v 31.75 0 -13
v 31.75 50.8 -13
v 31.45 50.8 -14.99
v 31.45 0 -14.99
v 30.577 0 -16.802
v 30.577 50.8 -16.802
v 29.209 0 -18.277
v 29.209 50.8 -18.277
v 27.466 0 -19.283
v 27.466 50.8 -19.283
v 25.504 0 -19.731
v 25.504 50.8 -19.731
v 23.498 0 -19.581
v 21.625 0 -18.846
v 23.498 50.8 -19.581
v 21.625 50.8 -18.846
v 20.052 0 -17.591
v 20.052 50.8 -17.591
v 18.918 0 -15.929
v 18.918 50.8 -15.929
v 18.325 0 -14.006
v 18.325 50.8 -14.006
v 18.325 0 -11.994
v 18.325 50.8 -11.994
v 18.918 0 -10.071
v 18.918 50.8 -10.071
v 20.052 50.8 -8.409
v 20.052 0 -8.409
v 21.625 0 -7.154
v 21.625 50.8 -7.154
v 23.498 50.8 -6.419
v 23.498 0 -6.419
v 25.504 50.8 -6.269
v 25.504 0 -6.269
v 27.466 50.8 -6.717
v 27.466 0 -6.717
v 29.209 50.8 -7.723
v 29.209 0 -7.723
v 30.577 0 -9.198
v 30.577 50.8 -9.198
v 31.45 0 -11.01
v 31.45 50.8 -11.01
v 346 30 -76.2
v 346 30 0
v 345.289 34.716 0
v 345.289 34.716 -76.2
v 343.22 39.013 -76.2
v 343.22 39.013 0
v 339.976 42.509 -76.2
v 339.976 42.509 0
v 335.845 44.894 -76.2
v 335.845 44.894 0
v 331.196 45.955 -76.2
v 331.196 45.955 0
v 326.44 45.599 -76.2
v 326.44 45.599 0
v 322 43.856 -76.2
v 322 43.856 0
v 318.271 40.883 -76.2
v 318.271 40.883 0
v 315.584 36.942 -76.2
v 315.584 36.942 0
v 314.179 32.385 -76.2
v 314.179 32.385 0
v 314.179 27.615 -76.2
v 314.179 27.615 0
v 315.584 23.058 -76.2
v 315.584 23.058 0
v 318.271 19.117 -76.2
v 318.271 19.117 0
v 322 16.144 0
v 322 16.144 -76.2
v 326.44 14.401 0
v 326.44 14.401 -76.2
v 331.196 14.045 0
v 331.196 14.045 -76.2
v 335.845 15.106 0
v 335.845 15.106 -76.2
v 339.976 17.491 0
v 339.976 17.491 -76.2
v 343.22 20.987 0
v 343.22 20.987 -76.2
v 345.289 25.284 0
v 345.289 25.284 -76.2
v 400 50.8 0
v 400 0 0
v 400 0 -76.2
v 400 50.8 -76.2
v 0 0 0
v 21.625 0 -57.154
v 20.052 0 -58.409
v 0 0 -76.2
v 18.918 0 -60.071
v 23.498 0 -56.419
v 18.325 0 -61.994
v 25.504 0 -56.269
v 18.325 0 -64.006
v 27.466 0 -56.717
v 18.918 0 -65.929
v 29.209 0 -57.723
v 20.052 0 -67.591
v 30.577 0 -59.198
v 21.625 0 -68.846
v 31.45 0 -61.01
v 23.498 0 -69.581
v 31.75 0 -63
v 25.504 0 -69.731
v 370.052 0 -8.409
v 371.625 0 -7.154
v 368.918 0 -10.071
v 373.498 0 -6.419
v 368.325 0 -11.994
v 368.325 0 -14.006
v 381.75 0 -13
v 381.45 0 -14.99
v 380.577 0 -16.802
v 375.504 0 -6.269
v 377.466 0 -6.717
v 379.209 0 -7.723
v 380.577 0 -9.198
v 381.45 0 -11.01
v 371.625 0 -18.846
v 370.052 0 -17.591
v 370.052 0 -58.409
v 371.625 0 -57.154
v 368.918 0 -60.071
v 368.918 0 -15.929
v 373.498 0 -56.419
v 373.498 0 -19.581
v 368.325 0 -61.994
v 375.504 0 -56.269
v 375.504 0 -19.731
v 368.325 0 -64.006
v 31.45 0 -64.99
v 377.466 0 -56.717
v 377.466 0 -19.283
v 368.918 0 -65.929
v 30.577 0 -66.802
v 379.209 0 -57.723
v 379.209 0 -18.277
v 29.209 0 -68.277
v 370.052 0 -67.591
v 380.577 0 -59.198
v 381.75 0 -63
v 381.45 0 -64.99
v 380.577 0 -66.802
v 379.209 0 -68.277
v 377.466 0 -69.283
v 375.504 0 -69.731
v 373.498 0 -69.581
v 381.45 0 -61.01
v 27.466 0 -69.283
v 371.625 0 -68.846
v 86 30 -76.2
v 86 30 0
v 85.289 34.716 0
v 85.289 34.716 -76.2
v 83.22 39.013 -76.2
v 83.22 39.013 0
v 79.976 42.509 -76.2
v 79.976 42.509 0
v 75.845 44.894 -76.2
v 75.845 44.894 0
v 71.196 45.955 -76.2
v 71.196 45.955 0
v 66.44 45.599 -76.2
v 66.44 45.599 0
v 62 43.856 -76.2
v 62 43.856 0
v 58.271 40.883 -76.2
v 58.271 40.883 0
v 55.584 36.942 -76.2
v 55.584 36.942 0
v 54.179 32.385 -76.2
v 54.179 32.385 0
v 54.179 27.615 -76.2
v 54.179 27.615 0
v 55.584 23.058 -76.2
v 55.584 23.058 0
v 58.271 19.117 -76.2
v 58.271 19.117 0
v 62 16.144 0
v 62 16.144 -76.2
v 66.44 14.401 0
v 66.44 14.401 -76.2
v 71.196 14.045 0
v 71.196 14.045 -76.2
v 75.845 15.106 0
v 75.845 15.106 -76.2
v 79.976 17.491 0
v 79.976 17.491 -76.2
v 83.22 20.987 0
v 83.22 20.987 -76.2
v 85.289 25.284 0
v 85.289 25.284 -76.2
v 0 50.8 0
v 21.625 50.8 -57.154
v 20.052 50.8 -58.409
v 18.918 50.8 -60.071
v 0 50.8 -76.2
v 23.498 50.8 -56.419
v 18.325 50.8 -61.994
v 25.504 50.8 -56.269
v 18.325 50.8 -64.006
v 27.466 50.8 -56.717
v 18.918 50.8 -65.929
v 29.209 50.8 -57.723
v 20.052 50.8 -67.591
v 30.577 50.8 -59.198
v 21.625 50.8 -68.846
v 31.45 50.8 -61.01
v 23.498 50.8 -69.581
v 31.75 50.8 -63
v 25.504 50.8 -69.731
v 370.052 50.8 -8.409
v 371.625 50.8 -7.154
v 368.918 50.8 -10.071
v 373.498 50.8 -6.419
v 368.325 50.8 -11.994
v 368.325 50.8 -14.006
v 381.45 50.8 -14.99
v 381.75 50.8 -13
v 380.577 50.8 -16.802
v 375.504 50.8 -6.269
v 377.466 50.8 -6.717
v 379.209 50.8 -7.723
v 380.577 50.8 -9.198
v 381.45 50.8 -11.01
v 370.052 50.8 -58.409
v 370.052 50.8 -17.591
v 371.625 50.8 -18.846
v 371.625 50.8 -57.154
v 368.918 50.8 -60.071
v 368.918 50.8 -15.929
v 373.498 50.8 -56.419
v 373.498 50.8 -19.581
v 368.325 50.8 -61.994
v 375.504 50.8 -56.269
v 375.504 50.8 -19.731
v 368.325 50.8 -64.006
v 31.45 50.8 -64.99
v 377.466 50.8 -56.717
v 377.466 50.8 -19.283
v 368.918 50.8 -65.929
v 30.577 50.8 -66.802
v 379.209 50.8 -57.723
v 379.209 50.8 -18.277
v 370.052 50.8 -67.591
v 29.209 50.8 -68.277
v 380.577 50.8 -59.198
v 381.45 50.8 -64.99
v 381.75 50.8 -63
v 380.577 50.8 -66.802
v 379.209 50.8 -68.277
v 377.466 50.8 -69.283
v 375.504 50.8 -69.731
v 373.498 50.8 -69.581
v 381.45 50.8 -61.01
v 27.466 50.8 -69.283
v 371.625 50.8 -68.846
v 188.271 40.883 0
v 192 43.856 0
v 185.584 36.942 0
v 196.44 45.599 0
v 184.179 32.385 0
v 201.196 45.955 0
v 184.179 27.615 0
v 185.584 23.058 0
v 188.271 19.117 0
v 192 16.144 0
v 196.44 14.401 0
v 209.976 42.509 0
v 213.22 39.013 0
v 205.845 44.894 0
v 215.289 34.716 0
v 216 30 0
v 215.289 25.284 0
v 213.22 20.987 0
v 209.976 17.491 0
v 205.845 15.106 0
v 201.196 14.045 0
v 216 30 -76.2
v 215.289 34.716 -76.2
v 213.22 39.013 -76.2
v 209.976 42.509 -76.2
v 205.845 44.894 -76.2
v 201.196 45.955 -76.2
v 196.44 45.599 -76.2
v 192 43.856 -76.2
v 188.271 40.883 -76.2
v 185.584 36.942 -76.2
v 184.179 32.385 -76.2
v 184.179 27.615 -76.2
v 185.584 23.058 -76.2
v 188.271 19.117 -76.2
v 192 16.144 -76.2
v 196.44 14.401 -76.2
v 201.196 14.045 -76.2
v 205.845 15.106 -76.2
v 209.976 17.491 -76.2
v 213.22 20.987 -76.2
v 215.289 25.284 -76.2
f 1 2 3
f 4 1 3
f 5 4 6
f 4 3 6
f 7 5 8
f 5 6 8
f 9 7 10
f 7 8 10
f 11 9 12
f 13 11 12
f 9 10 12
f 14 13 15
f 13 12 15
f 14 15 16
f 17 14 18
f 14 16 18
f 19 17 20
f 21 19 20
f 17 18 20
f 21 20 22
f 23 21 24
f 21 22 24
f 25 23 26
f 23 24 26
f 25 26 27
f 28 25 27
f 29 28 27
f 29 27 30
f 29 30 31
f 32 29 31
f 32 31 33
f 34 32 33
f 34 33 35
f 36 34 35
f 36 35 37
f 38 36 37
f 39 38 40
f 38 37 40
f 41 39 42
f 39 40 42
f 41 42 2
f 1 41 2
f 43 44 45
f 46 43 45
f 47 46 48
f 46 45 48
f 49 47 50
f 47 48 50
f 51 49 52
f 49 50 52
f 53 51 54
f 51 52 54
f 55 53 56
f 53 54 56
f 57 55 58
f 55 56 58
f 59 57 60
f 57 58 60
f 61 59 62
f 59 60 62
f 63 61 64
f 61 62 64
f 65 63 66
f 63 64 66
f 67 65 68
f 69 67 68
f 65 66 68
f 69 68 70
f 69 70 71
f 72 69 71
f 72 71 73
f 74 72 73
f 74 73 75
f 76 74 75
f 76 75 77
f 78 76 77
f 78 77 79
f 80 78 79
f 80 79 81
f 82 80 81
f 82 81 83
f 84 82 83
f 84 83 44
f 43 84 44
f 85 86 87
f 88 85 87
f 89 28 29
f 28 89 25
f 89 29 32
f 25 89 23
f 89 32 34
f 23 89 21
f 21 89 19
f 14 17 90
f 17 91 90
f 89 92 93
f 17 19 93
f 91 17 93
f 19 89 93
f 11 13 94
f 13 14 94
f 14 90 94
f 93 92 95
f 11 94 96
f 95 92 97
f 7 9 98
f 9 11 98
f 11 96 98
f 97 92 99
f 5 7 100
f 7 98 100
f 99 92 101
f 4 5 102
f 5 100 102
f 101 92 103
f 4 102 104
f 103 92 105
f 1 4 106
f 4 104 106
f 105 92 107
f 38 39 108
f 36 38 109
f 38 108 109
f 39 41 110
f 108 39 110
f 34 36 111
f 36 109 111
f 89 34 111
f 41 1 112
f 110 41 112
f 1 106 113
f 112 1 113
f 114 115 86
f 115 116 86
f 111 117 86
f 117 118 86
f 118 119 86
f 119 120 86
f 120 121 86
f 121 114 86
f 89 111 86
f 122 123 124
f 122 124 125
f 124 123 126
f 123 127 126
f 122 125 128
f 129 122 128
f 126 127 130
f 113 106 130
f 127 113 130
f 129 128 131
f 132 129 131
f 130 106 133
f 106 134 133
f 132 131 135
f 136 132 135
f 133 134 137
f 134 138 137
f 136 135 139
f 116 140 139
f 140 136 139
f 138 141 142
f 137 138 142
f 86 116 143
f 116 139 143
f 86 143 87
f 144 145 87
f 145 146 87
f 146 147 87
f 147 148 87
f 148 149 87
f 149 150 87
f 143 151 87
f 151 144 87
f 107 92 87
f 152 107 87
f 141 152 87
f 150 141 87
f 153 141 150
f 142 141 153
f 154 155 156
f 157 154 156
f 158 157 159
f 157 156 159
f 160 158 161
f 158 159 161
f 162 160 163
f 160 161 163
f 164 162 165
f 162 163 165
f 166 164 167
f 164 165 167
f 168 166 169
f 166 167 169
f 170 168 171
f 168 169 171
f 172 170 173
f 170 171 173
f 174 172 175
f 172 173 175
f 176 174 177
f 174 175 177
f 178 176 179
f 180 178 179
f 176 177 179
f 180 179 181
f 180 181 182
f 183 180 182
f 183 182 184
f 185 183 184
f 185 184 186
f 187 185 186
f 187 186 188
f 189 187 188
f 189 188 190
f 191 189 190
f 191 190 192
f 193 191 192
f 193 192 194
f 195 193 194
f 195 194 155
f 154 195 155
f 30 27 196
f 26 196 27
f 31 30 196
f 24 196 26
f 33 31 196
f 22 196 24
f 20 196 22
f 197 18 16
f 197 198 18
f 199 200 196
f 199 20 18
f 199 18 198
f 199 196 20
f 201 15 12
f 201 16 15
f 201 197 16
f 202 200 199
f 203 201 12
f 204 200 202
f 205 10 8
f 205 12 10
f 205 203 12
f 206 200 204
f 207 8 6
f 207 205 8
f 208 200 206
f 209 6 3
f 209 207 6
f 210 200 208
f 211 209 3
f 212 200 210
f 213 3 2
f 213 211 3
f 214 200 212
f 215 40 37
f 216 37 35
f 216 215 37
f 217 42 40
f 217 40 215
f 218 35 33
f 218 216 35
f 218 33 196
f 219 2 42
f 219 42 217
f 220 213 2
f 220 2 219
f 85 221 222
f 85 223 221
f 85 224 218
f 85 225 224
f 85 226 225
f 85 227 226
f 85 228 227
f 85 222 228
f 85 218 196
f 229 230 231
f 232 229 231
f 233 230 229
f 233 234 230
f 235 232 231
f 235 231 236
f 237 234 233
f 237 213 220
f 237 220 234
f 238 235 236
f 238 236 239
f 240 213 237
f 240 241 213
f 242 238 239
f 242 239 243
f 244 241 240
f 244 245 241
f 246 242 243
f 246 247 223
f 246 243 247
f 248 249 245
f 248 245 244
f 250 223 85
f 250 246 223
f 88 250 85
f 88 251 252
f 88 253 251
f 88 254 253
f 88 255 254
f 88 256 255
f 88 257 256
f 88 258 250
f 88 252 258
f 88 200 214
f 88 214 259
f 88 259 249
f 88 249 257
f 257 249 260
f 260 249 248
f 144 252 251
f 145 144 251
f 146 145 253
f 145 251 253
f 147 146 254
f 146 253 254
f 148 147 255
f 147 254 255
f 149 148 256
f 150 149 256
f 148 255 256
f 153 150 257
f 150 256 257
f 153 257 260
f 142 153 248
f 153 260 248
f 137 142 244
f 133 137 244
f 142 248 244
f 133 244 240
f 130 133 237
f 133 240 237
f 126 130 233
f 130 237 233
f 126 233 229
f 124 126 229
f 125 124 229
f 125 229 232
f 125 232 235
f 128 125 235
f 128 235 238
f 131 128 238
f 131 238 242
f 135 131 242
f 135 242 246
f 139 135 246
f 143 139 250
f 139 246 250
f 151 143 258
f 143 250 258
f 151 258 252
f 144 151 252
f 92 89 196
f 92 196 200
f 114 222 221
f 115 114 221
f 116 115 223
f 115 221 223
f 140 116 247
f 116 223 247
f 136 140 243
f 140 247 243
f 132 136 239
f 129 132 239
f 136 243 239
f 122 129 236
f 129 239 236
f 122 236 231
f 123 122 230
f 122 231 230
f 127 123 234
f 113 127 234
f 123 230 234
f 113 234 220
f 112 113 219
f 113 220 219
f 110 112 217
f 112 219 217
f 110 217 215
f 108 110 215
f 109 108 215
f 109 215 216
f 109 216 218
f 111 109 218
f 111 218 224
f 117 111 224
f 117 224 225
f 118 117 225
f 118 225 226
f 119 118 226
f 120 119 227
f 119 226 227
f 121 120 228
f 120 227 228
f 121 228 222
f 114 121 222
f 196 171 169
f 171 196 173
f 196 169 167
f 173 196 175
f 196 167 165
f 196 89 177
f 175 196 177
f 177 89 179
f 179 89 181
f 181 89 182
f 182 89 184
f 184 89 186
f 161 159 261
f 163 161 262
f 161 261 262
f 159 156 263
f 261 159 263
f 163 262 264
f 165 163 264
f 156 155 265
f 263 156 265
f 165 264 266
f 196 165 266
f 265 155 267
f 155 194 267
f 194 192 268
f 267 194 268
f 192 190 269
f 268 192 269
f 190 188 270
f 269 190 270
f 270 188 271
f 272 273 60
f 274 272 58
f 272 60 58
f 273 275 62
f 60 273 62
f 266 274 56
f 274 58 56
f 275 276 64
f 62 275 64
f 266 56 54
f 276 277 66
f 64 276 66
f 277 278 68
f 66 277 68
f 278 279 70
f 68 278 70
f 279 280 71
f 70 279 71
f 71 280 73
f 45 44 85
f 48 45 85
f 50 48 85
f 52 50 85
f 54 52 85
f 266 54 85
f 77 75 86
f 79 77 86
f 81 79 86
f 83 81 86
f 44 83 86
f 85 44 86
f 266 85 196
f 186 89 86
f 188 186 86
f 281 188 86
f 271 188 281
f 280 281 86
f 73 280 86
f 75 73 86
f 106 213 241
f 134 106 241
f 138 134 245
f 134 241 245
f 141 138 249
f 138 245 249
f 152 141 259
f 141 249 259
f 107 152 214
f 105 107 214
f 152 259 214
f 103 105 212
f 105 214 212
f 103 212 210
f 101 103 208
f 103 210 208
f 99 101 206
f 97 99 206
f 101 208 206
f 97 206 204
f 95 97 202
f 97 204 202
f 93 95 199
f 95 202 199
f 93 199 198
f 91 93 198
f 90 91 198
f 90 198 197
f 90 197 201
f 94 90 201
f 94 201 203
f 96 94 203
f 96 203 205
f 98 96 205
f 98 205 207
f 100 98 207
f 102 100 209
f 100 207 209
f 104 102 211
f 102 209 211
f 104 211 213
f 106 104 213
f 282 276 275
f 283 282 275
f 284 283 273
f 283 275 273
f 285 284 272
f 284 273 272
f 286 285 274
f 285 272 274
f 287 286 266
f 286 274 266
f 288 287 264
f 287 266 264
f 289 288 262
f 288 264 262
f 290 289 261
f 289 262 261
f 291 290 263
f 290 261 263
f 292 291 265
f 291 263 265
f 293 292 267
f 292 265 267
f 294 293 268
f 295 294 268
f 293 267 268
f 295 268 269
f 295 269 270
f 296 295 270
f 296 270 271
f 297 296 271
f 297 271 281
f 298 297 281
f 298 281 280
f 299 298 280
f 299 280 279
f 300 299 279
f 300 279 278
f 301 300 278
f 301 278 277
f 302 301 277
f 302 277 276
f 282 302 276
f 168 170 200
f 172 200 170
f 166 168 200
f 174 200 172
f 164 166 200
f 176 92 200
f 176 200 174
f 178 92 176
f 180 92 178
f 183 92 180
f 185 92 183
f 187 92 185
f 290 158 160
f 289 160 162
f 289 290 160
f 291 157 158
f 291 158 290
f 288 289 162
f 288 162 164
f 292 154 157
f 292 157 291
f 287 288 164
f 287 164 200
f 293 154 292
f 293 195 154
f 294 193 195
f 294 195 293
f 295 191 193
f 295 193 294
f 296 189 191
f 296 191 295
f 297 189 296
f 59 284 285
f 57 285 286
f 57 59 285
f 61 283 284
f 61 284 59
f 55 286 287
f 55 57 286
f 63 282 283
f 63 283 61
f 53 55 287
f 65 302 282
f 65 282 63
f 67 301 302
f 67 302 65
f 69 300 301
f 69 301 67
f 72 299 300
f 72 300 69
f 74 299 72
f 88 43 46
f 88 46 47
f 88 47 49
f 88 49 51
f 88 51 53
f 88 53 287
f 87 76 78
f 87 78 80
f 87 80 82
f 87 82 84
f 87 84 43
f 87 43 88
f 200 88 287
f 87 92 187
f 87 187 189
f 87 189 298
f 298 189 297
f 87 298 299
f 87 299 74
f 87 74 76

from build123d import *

# Parameters (mm, degrees)
SKETCH1_W           = 400
SKETCH1_H           = 76.2
BOSS_EXTRUDE1_DEPTH = 50.8
SKETCH3_R           = 6.75
CUT_EXTRUDE2_DEPTH  = 50.8
SKETCH5_R           = 16
CUT_EXTRUDE3_DEPTH  = 77.2


with BuildPart() as part:
    # Sketch1 → Boss-Extrude1 (new body)
    with BuildSketch(Plane(origin=(0, 0, 0), x_dir=(1, 0, 0), z_dir=(0, 1, 0))):
        with Locations((200, 38.1)):
            Rectangle(SKETCH1_W, SKETCH1_H)
    extrude(amount=BOSS_EXTRUDE1_DEPTH)

    # Sketch3 → Cut-Extrude2 (cut)
    with BuildSketch(Plane(origin=(0, 50.8, 0), x_dir=(1, 0, 0), z_dir=(0, 1, 0))):
        with Locations((25, 63)):
            Circle(SKETCH3_R)
        with Locations((25, 13)):
            Circle(SKETCH3_R)
        with Locations((375, 63)):
            Circle(SKETCH3_R)
        with Locations((375, 13)):
            Circle(SKETCH3_R)
    extrude(amount=-CUT_EXTRUDE2_DEPTH, mode=Mode.SUBTRACT)

    # Sketch5 → Cut-Extrude3 (cut, through all)
    with BuildSketch(Plane.XY):
        with Locations((200, 30)):
            Circle(SKETCH5_R)
        with Locations((70, 30)):
            Circle(SKETCH5_R)
        with Locations((330, 30)):
            Circle(SKETCH5_R)
    extrude(amount=-CUT_EXTRUDE3_DEPTH, mode=Mode.SUBTRACT)


solid = part.part
